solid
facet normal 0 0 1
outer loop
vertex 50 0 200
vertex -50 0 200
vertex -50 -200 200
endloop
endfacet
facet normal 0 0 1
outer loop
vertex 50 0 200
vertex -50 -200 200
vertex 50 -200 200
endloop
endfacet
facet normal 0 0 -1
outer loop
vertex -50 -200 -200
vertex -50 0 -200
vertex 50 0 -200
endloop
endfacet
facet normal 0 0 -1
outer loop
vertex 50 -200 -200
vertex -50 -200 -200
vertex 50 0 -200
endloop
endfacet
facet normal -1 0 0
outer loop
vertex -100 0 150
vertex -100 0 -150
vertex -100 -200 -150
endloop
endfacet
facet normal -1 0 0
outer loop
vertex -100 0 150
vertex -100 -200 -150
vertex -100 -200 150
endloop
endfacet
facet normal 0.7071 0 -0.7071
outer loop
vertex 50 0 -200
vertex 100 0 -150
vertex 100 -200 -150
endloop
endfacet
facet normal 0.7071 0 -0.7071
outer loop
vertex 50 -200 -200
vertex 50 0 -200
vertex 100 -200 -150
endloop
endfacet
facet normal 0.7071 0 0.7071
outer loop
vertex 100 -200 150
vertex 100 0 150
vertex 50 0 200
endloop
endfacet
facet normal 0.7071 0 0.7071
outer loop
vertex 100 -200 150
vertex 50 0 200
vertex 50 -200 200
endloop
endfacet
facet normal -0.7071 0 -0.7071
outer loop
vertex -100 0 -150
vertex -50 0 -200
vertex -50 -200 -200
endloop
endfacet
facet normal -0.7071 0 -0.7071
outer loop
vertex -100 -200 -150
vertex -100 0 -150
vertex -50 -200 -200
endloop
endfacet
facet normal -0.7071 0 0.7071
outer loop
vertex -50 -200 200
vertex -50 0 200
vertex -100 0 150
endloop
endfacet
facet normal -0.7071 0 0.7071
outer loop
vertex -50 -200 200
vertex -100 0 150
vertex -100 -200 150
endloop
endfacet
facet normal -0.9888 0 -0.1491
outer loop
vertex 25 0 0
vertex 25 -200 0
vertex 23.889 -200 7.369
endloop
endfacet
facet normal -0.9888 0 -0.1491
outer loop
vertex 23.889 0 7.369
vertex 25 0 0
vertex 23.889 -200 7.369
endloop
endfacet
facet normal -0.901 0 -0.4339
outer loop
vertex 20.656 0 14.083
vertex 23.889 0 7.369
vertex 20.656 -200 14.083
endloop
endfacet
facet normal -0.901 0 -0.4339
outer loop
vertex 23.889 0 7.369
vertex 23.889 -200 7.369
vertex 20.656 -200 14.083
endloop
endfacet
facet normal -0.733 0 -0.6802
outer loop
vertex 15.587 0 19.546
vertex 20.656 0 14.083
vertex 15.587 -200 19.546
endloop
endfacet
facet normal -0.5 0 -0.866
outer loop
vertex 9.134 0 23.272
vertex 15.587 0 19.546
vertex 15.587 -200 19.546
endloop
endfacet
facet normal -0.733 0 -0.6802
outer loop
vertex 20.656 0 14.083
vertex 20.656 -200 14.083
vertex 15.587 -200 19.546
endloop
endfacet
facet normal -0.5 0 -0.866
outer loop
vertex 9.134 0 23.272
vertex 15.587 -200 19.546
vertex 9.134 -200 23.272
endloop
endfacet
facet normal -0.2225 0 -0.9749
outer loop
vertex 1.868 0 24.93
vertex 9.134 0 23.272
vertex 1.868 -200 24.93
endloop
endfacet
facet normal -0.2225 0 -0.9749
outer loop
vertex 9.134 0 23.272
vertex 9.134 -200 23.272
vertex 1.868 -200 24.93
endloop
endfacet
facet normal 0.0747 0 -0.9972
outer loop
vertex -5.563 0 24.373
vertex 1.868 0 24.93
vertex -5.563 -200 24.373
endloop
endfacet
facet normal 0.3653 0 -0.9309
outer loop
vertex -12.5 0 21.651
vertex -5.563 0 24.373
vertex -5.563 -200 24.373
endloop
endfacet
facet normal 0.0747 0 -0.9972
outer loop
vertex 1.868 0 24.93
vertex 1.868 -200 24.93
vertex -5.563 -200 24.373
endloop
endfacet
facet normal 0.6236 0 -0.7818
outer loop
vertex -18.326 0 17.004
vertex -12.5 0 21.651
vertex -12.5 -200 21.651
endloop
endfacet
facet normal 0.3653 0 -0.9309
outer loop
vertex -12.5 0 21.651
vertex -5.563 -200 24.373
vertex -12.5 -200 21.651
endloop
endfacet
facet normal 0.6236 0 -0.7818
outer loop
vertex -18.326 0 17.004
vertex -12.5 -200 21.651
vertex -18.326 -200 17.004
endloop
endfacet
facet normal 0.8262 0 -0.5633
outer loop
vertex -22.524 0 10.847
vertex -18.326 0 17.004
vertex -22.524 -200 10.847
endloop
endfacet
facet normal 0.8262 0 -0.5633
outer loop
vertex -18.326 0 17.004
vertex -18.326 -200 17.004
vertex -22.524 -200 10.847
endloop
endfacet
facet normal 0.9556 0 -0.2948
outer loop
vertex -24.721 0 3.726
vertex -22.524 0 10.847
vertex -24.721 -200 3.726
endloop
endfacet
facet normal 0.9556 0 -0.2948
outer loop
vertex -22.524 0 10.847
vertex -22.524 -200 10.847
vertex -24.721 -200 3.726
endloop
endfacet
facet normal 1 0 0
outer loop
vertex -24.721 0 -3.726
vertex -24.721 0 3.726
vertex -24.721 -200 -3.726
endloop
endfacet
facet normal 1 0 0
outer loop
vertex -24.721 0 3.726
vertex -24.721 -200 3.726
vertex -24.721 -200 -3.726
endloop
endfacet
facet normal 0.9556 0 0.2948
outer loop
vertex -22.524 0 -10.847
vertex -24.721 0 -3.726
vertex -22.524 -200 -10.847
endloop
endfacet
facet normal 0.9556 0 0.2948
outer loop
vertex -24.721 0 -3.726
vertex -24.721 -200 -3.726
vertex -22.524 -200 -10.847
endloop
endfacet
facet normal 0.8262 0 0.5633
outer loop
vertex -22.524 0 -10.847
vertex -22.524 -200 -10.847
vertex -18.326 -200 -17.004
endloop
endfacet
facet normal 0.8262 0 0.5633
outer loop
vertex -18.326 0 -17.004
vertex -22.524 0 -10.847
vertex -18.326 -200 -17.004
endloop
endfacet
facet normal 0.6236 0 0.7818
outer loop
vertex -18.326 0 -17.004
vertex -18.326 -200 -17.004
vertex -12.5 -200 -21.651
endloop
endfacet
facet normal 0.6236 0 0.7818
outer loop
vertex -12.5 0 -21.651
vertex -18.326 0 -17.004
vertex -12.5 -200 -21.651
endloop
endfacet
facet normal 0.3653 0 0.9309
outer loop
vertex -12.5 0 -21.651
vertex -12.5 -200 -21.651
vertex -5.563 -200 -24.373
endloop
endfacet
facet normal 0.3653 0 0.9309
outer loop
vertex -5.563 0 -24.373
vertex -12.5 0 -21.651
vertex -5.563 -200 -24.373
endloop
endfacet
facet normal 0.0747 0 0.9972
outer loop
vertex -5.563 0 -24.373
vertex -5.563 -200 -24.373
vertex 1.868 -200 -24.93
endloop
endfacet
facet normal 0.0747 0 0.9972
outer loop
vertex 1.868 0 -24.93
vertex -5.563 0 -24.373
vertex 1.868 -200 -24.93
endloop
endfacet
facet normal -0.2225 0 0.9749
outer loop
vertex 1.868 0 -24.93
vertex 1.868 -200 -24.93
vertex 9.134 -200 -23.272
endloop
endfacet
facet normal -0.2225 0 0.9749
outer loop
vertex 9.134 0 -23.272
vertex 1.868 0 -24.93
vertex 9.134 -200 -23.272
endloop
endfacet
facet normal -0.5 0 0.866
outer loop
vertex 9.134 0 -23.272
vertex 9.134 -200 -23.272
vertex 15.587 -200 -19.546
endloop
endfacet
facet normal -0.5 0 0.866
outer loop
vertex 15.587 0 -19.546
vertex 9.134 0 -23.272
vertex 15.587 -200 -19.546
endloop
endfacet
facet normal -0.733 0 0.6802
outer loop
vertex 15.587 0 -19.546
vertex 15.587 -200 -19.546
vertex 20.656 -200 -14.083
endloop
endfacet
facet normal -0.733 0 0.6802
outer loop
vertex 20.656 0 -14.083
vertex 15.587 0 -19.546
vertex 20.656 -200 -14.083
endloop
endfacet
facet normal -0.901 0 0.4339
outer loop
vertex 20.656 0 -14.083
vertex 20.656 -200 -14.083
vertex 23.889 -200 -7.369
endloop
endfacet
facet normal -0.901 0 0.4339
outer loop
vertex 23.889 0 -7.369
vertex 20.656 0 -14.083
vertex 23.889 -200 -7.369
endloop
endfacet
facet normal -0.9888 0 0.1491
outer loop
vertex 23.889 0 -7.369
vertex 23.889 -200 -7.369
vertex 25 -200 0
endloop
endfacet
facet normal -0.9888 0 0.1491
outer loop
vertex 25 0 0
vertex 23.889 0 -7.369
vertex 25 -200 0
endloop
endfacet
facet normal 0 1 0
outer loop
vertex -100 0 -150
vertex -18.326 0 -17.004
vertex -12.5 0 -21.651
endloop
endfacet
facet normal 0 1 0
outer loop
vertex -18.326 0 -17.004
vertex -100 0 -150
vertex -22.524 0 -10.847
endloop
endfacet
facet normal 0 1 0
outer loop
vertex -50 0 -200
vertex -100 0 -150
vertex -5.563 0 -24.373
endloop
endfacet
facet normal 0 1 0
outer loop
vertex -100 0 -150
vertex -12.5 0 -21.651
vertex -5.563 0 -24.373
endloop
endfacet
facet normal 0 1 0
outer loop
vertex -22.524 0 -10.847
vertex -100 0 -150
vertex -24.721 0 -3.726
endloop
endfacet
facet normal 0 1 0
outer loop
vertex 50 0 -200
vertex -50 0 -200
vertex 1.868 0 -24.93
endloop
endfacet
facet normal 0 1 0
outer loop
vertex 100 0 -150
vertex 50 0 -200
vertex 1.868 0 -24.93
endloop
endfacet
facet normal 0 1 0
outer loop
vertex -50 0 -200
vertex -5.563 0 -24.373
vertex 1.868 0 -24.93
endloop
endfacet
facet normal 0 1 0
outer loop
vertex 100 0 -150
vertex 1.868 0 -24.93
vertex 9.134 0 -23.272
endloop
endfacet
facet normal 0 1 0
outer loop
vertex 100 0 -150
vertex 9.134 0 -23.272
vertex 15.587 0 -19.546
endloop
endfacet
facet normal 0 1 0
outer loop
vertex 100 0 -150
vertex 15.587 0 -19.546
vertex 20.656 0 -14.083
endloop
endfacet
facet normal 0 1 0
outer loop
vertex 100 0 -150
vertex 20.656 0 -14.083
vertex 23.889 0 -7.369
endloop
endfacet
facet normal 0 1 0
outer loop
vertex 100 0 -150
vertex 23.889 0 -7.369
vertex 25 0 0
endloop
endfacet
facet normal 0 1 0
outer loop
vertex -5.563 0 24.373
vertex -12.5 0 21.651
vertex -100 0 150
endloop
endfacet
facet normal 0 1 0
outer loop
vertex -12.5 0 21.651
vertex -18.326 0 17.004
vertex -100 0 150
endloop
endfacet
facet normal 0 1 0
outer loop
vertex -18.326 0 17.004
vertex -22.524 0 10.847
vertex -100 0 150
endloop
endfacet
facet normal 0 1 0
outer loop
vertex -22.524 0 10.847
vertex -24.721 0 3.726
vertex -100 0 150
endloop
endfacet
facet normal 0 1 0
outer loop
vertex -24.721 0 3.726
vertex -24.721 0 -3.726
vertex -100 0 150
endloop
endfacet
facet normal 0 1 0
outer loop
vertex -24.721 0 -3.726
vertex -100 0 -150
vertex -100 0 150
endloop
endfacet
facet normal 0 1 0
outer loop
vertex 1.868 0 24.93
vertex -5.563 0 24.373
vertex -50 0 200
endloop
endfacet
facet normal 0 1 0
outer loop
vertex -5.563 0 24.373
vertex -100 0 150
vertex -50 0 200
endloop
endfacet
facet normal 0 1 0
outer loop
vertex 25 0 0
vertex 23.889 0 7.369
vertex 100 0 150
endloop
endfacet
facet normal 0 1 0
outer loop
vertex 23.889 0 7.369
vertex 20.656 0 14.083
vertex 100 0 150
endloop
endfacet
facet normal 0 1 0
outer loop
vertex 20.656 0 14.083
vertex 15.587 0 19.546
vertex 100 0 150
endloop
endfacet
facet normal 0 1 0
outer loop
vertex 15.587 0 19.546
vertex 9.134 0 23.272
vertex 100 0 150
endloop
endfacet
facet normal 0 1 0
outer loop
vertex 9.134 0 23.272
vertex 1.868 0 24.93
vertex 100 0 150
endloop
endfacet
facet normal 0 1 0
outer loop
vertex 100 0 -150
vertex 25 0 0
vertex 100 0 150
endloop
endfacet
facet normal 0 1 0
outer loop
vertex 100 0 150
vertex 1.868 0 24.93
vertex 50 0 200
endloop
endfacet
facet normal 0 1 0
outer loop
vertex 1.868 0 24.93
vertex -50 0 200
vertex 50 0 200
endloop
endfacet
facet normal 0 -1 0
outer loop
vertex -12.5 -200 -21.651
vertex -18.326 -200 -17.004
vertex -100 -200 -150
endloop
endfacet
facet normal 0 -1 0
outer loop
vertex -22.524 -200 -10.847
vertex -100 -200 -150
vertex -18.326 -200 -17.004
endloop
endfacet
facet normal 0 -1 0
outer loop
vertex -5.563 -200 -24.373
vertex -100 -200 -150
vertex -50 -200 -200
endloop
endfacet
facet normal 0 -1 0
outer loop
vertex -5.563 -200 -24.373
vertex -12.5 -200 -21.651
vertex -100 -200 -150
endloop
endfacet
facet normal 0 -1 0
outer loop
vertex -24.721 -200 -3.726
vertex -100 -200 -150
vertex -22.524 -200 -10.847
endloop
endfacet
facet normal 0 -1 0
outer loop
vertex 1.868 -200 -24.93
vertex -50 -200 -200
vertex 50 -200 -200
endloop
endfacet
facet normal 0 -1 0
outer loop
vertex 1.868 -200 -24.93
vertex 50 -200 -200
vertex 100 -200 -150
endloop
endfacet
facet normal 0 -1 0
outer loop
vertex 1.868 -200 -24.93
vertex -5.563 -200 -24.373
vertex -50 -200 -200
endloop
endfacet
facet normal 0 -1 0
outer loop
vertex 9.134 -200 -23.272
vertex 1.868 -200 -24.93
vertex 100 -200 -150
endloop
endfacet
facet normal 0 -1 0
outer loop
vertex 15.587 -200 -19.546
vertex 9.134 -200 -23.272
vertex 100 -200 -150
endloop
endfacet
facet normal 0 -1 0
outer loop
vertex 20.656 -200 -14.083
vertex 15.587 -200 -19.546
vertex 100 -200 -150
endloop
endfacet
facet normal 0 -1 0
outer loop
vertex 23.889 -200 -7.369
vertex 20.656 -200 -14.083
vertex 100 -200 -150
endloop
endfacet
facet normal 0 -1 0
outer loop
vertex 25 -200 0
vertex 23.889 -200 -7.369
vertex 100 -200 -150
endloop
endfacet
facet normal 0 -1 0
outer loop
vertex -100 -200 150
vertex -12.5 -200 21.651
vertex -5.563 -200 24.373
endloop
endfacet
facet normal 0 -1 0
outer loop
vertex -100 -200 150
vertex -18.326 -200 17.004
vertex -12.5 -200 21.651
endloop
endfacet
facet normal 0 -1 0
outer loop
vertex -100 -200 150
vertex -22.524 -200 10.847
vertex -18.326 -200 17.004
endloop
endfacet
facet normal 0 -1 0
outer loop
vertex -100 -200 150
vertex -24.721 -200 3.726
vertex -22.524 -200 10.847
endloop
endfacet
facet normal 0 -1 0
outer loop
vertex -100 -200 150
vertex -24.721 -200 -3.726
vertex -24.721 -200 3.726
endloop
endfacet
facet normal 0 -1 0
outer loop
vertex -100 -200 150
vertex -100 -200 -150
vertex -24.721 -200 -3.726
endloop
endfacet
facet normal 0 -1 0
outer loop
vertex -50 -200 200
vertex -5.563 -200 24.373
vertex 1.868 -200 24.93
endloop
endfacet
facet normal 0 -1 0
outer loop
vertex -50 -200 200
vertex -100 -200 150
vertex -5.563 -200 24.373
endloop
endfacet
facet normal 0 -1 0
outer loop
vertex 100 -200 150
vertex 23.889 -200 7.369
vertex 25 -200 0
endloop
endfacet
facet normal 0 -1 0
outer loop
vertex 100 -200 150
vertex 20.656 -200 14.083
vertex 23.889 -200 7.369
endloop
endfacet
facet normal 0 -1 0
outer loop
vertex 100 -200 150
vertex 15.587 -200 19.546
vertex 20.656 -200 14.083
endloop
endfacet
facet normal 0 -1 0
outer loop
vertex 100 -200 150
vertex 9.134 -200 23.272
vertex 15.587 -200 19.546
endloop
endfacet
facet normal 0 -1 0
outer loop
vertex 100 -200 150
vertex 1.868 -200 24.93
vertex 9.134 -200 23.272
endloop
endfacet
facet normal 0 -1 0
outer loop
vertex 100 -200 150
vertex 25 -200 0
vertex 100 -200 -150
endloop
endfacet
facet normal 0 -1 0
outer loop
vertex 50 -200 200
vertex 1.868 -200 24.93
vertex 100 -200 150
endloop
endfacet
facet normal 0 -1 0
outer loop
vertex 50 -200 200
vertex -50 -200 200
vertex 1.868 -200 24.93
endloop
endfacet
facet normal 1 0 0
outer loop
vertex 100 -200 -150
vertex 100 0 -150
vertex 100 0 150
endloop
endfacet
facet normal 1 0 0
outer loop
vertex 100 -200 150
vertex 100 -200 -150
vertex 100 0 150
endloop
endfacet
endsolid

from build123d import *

# Parameters (mm, degrees)
F0_W     = 200
F0_H     = 400
F1_DEPTH = 200
F2_R     = 25
F3_DEPTH = 200.001
F4_SIZE  = 50
F5_SIZE  = 50


with BuildPart() as f1:
    # F0 (on Front) → F1 (new body)
    with BuildSketch(Plane.XZ):
        Rectangle(F0_W, F0_H)
    extrude(amount=F1_DEPTH)

    # F2 (on face) → F3 (cut, through all)
    with BuildSketch(Plane.XZ.offset(200)):
        Circle(F2_R)
    extrude(amount=-F3_DEPTH, mode=Mode.SUBTRACT)

    # F4
    f4_edges = [f1.edges().sort_by_distance(p)[0] for p in [
        (-100, -100, -200),
    ]]
    chamfer(f4_edges, length=F4_SIZE)

    # F5
    f5_edges = [f1.edges().sort_by_distance(p)[0] for p in [
        (100, -100, -200),
        (-100, -100, 200),
        (100, -100, 200),
    ]]
    chamfer(f5_edges, length=F5_SIZE)


solid = f1.part
